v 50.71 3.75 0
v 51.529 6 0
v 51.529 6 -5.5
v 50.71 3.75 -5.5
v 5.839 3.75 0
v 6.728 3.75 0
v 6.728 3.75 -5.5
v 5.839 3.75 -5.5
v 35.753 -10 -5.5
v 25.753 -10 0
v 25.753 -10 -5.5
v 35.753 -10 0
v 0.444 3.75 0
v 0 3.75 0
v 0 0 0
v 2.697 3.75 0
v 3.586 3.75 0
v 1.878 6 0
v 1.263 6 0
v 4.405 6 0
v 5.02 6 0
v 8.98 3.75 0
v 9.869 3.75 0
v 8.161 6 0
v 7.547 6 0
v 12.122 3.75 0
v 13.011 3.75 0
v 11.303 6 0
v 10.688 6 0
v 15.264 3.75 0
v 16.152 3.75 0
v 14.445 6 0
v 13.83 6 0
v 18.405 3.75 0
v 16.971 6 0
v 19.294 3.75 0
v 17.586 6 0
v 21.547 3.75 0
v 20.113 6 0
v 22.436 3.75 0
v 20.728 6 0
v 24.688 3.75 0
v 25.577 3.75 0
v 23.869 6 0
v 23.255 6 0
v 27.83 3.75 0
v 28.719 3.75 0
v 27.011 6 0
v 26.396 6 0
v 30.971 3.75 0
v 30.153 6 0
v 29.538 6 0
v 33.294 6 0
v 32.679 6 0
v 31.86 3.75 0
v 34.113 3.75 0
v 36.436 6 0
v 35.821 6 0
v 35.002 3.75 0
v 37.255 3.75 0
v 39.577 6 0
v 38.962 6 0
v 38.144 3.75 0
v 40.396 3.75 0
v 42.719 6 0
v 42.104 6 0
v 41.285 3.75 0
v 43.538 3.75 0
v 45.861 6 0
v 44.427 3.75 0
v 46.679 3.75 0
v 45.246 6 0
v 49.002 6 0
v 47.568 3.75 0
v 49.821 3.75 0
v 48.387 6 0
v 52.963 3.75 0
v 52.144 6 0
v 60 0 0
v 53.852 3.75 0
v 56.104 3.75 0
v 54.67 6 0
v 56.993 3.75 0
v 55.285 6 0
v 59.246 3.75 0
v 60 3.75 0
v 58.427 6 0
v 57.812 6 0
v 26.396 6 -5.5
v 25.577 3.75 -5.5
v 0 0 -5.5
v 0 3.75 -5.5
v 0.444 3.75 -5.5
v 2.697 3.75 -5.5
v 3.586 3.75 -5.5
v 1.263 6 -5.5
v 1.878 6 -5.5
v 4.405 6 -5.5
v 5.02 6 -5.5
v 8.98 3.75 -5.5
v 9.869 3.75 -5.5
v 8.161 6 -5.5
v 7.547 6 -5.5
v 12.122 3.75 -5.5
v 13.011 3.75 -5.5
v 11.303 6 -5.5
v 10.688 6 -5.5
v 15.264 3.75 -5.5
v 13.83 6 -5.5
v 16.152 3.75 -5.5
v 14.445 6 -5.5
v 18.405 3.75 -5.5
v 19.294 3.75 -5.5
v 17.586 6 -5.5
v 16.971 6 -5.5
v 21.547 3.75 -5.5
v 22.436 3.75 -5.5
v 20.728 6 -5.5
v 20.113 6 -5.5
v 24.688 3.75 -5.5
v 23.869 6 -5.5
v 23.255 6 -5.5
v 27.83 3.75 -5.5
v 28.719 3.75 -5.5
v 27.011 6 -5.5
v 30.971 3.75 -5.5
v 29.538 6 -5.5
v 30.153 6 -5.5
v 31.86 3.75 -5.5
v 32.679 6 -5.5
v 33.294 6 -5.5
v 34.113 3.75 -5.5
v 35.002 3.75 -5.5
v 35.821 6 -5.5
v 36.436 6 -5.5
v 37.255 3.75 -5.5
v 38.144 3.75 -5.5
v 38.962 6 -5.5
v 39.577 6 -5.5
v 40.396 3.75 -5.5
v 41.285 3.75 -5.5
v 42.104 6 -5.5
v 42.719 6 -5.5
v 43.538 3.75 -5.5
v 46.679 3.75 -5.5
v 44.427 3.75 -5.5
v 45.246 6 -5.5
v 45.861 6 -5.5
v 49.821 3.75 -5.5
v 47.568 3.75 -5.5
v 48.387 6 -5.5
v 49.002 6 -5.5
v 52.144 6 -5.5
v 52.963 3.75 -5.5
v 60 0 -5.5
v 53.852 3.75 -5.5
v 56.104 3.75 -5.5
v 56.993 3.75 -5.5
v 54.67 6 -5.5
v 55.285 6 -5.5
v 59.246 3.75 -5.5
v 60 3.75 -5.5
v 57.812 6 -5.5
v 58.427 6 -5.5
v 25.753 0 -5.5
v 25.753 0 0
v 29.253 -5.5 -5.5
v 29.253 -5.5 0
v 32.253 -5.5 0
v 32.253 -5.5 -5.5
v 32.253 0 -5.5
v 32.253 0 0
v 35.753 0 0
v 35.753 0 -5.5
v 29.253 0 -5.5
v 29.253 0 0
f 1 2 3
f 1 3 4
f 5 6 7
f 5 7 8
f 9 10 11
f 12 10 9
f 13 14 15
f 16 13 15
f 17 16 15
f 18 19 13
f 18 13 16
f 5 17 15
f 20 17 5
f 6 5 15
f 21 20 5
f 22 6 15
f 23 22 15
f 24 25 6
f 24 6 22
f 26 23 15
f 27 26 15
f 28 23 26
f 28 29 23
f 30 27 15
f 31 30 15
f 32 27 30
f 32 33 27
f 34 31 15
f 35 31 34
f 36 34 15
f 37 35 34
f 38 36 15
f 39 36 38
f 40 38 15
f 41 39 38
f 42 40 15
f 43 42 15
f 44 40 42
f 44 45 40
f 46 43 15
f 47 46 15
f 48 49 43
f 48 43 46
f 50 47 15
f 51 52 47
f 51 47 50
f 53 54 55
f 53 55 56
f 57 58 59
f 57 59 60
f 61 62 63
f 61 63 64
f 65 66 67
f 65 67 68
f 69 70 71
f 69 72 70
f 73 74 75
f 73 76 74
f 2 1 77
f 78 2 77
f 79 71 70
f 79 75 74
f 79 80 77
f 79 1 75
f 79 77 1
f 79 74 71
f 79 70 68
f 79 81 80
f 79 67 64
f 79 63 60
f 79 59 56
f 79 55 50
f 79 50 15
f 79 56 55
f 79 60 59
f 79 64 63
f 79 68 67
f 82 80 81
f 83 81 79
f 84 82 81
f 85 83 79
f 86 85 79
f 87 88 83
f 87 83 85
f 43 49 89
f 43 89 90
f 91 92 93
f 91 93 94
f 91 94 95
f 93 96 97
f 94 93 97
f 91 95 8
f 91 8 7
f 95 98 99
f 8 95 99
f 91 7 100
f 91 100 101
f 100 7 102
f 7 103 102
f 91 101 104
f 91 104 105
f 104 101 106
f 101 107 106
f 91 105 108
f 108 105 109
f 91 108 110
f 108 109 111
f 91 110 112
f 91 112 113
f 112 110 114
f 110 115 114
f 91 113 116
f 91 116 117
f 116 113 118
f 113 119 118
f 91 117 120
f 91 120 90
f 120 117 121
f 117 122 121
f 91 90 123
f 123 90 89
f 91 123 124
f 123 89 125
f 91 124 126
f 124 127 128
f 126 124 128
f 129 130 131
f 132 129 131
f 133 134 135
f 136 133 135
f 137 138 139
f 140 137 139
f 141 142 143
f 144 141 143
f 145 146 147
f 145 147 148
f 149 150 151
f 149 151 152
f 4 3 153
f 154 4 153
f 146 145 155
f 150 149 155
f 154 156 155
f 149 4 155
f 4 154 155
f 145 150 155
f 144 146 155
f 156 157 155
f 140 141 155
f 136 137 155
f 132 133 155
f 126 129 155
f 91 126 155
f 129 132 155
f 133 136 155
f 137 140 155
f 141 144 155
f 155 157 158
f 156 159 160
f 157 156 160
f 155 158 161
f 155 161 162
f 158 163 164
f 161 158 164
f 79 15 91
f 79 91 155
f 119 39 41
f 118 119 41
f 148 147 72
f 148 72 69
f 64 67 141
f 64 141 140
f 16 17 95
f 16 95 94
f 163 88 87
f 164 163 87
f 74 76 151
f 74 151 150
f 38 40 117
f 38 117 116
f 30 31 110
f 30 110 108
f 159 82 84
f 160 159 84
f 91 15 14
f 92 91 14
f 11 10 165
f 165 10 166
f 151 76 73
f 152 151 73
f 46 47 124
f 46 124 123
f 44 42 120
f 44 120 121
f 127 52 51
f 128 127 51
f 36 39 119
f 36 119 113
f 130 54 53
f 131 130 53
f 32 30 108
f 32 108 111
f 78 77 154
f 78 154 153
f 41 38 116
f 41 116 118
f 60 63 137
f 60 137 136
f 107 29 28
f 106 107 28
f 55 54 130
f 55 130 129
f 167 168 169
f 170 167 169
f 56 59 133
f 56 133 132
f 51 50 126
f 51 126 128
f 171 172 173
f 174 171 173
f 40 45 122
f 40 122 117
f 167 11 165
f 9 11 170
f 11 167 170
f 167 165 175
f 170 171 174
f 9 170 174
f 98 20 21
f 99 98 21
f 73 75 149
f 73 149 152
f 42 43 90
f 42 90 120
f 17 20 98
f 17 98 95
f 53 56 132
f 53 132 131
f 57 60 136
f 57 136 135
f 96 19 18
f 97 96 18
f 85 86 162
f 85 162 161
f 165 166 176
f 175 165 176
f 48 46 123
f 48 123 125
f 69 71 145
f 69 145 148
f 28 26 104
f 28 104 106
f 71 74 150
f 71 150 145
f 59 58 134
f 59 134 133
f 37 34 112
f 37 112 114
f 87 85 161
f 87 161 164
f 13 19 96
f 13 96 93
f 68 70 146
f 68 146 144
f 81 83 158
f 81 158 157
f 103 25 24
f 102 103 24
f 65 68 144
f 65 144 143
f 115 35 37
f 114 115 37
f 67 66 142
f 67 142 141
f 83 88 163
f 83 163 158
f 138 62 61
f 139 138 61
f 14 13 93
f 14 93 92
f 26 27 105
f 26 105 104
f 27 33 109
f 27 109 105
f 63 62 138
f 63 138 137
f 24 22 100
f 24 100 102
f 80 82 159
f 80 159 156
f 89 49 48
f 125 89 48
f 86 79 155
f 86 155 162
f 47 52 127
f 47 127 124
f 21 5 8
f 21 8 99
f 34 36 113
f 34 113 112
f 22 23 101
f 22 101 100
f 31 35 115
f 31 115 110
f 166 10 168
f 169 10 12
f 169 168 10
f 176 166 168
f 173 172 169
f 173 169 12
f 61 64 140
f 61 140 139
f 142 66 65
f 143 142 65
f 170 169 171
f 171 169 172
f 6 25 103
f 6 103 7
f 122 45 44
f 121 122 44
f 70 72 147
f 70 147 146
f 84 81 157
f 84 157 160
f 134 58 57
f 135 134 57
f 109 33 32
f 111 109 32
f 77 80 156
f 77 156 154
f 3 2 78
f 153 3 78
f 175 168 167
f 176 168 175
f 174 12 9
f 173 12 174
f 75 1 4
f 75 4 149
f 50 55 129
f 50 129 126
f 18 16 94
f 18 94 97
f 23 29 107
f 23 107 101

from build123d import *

# Parameters (mm, degrees)
BLANKSKE_W          = 60
BLANKSKE_H          = 6
BLANK_DEPTH         = 5.5
TOOTHCUTSIM_DEPTH   = 61.549566472
TEETHCUTS_COUNT     = 20
TEETHCUTS_PITCH     = 3.14159265
SKETCH_1_W          = 10
SKETCH_1_H          = 10
EXTRUDE_1_DEPTH     = 5.5
SKETCH_2_W          = 3
SKETCH_2_H          = 5.5
CUT_EXTRUDE_1_DEPTH = 62.075772611


with BuildPart() as part:
    # BlankSke → Blank (new body)
    with BuildSketch(Plane.XY):
        with Locations((30, 3)):
            Rectangle(BLANKSKE_W, BLANKSKE_H)
    extrude(amount=-BLANK_DEPTH)

    # TooCutSkeSim → ToothCutSim (cut, through all)
    with BuildSketch(Plane.XY):
        Polygon((0.44443537, 3.75), (-0.44443537, 3.75), (-1.272613241, 6.0254), (1.272613241, 6.0254), align=None)
    toothcutsim = extrude(amount=-TOOTHCUTSIM_DEPTH, mode=Mode.SUBTRACT)

    # TeethCuts: ToothCutSim ×20
    with Locations(*[(i * TEETHCUTS_PITCH, 0, 0) for i in range(1, TEETHCUTS_COUNT)]):
        add(toothcutsim, mode=Mode.SUBTRACT)


with BuildPart() as body_2:
    # ｽｹｯﾁ1 → ﾎﾞｽ - 押し出し1 (new body)
    with BuildSketch(Plane.XY):
        with Locations((30.752516819, -5)):
            Rectangle(SKETCH_1_W, SKETCH_1_H)
    extrude(amount=-EXTRUDE_1_DEPTH)

    # ｽｹｯﾁ2 → ｶｯﾄ - 押し出し1 (cut, through all)
    with BuildSketch(Plane.XY):
        with Locations((30.752516819, -2.75)):
            Rectangle(SKETCH_2_W, SKETCH_2_H)
    extrude(amount=-CUT_EXTRUDE_1_DEPTH, mode=Mode.SUBTRACT)


solid = Compound([part.part, body_2.part])
